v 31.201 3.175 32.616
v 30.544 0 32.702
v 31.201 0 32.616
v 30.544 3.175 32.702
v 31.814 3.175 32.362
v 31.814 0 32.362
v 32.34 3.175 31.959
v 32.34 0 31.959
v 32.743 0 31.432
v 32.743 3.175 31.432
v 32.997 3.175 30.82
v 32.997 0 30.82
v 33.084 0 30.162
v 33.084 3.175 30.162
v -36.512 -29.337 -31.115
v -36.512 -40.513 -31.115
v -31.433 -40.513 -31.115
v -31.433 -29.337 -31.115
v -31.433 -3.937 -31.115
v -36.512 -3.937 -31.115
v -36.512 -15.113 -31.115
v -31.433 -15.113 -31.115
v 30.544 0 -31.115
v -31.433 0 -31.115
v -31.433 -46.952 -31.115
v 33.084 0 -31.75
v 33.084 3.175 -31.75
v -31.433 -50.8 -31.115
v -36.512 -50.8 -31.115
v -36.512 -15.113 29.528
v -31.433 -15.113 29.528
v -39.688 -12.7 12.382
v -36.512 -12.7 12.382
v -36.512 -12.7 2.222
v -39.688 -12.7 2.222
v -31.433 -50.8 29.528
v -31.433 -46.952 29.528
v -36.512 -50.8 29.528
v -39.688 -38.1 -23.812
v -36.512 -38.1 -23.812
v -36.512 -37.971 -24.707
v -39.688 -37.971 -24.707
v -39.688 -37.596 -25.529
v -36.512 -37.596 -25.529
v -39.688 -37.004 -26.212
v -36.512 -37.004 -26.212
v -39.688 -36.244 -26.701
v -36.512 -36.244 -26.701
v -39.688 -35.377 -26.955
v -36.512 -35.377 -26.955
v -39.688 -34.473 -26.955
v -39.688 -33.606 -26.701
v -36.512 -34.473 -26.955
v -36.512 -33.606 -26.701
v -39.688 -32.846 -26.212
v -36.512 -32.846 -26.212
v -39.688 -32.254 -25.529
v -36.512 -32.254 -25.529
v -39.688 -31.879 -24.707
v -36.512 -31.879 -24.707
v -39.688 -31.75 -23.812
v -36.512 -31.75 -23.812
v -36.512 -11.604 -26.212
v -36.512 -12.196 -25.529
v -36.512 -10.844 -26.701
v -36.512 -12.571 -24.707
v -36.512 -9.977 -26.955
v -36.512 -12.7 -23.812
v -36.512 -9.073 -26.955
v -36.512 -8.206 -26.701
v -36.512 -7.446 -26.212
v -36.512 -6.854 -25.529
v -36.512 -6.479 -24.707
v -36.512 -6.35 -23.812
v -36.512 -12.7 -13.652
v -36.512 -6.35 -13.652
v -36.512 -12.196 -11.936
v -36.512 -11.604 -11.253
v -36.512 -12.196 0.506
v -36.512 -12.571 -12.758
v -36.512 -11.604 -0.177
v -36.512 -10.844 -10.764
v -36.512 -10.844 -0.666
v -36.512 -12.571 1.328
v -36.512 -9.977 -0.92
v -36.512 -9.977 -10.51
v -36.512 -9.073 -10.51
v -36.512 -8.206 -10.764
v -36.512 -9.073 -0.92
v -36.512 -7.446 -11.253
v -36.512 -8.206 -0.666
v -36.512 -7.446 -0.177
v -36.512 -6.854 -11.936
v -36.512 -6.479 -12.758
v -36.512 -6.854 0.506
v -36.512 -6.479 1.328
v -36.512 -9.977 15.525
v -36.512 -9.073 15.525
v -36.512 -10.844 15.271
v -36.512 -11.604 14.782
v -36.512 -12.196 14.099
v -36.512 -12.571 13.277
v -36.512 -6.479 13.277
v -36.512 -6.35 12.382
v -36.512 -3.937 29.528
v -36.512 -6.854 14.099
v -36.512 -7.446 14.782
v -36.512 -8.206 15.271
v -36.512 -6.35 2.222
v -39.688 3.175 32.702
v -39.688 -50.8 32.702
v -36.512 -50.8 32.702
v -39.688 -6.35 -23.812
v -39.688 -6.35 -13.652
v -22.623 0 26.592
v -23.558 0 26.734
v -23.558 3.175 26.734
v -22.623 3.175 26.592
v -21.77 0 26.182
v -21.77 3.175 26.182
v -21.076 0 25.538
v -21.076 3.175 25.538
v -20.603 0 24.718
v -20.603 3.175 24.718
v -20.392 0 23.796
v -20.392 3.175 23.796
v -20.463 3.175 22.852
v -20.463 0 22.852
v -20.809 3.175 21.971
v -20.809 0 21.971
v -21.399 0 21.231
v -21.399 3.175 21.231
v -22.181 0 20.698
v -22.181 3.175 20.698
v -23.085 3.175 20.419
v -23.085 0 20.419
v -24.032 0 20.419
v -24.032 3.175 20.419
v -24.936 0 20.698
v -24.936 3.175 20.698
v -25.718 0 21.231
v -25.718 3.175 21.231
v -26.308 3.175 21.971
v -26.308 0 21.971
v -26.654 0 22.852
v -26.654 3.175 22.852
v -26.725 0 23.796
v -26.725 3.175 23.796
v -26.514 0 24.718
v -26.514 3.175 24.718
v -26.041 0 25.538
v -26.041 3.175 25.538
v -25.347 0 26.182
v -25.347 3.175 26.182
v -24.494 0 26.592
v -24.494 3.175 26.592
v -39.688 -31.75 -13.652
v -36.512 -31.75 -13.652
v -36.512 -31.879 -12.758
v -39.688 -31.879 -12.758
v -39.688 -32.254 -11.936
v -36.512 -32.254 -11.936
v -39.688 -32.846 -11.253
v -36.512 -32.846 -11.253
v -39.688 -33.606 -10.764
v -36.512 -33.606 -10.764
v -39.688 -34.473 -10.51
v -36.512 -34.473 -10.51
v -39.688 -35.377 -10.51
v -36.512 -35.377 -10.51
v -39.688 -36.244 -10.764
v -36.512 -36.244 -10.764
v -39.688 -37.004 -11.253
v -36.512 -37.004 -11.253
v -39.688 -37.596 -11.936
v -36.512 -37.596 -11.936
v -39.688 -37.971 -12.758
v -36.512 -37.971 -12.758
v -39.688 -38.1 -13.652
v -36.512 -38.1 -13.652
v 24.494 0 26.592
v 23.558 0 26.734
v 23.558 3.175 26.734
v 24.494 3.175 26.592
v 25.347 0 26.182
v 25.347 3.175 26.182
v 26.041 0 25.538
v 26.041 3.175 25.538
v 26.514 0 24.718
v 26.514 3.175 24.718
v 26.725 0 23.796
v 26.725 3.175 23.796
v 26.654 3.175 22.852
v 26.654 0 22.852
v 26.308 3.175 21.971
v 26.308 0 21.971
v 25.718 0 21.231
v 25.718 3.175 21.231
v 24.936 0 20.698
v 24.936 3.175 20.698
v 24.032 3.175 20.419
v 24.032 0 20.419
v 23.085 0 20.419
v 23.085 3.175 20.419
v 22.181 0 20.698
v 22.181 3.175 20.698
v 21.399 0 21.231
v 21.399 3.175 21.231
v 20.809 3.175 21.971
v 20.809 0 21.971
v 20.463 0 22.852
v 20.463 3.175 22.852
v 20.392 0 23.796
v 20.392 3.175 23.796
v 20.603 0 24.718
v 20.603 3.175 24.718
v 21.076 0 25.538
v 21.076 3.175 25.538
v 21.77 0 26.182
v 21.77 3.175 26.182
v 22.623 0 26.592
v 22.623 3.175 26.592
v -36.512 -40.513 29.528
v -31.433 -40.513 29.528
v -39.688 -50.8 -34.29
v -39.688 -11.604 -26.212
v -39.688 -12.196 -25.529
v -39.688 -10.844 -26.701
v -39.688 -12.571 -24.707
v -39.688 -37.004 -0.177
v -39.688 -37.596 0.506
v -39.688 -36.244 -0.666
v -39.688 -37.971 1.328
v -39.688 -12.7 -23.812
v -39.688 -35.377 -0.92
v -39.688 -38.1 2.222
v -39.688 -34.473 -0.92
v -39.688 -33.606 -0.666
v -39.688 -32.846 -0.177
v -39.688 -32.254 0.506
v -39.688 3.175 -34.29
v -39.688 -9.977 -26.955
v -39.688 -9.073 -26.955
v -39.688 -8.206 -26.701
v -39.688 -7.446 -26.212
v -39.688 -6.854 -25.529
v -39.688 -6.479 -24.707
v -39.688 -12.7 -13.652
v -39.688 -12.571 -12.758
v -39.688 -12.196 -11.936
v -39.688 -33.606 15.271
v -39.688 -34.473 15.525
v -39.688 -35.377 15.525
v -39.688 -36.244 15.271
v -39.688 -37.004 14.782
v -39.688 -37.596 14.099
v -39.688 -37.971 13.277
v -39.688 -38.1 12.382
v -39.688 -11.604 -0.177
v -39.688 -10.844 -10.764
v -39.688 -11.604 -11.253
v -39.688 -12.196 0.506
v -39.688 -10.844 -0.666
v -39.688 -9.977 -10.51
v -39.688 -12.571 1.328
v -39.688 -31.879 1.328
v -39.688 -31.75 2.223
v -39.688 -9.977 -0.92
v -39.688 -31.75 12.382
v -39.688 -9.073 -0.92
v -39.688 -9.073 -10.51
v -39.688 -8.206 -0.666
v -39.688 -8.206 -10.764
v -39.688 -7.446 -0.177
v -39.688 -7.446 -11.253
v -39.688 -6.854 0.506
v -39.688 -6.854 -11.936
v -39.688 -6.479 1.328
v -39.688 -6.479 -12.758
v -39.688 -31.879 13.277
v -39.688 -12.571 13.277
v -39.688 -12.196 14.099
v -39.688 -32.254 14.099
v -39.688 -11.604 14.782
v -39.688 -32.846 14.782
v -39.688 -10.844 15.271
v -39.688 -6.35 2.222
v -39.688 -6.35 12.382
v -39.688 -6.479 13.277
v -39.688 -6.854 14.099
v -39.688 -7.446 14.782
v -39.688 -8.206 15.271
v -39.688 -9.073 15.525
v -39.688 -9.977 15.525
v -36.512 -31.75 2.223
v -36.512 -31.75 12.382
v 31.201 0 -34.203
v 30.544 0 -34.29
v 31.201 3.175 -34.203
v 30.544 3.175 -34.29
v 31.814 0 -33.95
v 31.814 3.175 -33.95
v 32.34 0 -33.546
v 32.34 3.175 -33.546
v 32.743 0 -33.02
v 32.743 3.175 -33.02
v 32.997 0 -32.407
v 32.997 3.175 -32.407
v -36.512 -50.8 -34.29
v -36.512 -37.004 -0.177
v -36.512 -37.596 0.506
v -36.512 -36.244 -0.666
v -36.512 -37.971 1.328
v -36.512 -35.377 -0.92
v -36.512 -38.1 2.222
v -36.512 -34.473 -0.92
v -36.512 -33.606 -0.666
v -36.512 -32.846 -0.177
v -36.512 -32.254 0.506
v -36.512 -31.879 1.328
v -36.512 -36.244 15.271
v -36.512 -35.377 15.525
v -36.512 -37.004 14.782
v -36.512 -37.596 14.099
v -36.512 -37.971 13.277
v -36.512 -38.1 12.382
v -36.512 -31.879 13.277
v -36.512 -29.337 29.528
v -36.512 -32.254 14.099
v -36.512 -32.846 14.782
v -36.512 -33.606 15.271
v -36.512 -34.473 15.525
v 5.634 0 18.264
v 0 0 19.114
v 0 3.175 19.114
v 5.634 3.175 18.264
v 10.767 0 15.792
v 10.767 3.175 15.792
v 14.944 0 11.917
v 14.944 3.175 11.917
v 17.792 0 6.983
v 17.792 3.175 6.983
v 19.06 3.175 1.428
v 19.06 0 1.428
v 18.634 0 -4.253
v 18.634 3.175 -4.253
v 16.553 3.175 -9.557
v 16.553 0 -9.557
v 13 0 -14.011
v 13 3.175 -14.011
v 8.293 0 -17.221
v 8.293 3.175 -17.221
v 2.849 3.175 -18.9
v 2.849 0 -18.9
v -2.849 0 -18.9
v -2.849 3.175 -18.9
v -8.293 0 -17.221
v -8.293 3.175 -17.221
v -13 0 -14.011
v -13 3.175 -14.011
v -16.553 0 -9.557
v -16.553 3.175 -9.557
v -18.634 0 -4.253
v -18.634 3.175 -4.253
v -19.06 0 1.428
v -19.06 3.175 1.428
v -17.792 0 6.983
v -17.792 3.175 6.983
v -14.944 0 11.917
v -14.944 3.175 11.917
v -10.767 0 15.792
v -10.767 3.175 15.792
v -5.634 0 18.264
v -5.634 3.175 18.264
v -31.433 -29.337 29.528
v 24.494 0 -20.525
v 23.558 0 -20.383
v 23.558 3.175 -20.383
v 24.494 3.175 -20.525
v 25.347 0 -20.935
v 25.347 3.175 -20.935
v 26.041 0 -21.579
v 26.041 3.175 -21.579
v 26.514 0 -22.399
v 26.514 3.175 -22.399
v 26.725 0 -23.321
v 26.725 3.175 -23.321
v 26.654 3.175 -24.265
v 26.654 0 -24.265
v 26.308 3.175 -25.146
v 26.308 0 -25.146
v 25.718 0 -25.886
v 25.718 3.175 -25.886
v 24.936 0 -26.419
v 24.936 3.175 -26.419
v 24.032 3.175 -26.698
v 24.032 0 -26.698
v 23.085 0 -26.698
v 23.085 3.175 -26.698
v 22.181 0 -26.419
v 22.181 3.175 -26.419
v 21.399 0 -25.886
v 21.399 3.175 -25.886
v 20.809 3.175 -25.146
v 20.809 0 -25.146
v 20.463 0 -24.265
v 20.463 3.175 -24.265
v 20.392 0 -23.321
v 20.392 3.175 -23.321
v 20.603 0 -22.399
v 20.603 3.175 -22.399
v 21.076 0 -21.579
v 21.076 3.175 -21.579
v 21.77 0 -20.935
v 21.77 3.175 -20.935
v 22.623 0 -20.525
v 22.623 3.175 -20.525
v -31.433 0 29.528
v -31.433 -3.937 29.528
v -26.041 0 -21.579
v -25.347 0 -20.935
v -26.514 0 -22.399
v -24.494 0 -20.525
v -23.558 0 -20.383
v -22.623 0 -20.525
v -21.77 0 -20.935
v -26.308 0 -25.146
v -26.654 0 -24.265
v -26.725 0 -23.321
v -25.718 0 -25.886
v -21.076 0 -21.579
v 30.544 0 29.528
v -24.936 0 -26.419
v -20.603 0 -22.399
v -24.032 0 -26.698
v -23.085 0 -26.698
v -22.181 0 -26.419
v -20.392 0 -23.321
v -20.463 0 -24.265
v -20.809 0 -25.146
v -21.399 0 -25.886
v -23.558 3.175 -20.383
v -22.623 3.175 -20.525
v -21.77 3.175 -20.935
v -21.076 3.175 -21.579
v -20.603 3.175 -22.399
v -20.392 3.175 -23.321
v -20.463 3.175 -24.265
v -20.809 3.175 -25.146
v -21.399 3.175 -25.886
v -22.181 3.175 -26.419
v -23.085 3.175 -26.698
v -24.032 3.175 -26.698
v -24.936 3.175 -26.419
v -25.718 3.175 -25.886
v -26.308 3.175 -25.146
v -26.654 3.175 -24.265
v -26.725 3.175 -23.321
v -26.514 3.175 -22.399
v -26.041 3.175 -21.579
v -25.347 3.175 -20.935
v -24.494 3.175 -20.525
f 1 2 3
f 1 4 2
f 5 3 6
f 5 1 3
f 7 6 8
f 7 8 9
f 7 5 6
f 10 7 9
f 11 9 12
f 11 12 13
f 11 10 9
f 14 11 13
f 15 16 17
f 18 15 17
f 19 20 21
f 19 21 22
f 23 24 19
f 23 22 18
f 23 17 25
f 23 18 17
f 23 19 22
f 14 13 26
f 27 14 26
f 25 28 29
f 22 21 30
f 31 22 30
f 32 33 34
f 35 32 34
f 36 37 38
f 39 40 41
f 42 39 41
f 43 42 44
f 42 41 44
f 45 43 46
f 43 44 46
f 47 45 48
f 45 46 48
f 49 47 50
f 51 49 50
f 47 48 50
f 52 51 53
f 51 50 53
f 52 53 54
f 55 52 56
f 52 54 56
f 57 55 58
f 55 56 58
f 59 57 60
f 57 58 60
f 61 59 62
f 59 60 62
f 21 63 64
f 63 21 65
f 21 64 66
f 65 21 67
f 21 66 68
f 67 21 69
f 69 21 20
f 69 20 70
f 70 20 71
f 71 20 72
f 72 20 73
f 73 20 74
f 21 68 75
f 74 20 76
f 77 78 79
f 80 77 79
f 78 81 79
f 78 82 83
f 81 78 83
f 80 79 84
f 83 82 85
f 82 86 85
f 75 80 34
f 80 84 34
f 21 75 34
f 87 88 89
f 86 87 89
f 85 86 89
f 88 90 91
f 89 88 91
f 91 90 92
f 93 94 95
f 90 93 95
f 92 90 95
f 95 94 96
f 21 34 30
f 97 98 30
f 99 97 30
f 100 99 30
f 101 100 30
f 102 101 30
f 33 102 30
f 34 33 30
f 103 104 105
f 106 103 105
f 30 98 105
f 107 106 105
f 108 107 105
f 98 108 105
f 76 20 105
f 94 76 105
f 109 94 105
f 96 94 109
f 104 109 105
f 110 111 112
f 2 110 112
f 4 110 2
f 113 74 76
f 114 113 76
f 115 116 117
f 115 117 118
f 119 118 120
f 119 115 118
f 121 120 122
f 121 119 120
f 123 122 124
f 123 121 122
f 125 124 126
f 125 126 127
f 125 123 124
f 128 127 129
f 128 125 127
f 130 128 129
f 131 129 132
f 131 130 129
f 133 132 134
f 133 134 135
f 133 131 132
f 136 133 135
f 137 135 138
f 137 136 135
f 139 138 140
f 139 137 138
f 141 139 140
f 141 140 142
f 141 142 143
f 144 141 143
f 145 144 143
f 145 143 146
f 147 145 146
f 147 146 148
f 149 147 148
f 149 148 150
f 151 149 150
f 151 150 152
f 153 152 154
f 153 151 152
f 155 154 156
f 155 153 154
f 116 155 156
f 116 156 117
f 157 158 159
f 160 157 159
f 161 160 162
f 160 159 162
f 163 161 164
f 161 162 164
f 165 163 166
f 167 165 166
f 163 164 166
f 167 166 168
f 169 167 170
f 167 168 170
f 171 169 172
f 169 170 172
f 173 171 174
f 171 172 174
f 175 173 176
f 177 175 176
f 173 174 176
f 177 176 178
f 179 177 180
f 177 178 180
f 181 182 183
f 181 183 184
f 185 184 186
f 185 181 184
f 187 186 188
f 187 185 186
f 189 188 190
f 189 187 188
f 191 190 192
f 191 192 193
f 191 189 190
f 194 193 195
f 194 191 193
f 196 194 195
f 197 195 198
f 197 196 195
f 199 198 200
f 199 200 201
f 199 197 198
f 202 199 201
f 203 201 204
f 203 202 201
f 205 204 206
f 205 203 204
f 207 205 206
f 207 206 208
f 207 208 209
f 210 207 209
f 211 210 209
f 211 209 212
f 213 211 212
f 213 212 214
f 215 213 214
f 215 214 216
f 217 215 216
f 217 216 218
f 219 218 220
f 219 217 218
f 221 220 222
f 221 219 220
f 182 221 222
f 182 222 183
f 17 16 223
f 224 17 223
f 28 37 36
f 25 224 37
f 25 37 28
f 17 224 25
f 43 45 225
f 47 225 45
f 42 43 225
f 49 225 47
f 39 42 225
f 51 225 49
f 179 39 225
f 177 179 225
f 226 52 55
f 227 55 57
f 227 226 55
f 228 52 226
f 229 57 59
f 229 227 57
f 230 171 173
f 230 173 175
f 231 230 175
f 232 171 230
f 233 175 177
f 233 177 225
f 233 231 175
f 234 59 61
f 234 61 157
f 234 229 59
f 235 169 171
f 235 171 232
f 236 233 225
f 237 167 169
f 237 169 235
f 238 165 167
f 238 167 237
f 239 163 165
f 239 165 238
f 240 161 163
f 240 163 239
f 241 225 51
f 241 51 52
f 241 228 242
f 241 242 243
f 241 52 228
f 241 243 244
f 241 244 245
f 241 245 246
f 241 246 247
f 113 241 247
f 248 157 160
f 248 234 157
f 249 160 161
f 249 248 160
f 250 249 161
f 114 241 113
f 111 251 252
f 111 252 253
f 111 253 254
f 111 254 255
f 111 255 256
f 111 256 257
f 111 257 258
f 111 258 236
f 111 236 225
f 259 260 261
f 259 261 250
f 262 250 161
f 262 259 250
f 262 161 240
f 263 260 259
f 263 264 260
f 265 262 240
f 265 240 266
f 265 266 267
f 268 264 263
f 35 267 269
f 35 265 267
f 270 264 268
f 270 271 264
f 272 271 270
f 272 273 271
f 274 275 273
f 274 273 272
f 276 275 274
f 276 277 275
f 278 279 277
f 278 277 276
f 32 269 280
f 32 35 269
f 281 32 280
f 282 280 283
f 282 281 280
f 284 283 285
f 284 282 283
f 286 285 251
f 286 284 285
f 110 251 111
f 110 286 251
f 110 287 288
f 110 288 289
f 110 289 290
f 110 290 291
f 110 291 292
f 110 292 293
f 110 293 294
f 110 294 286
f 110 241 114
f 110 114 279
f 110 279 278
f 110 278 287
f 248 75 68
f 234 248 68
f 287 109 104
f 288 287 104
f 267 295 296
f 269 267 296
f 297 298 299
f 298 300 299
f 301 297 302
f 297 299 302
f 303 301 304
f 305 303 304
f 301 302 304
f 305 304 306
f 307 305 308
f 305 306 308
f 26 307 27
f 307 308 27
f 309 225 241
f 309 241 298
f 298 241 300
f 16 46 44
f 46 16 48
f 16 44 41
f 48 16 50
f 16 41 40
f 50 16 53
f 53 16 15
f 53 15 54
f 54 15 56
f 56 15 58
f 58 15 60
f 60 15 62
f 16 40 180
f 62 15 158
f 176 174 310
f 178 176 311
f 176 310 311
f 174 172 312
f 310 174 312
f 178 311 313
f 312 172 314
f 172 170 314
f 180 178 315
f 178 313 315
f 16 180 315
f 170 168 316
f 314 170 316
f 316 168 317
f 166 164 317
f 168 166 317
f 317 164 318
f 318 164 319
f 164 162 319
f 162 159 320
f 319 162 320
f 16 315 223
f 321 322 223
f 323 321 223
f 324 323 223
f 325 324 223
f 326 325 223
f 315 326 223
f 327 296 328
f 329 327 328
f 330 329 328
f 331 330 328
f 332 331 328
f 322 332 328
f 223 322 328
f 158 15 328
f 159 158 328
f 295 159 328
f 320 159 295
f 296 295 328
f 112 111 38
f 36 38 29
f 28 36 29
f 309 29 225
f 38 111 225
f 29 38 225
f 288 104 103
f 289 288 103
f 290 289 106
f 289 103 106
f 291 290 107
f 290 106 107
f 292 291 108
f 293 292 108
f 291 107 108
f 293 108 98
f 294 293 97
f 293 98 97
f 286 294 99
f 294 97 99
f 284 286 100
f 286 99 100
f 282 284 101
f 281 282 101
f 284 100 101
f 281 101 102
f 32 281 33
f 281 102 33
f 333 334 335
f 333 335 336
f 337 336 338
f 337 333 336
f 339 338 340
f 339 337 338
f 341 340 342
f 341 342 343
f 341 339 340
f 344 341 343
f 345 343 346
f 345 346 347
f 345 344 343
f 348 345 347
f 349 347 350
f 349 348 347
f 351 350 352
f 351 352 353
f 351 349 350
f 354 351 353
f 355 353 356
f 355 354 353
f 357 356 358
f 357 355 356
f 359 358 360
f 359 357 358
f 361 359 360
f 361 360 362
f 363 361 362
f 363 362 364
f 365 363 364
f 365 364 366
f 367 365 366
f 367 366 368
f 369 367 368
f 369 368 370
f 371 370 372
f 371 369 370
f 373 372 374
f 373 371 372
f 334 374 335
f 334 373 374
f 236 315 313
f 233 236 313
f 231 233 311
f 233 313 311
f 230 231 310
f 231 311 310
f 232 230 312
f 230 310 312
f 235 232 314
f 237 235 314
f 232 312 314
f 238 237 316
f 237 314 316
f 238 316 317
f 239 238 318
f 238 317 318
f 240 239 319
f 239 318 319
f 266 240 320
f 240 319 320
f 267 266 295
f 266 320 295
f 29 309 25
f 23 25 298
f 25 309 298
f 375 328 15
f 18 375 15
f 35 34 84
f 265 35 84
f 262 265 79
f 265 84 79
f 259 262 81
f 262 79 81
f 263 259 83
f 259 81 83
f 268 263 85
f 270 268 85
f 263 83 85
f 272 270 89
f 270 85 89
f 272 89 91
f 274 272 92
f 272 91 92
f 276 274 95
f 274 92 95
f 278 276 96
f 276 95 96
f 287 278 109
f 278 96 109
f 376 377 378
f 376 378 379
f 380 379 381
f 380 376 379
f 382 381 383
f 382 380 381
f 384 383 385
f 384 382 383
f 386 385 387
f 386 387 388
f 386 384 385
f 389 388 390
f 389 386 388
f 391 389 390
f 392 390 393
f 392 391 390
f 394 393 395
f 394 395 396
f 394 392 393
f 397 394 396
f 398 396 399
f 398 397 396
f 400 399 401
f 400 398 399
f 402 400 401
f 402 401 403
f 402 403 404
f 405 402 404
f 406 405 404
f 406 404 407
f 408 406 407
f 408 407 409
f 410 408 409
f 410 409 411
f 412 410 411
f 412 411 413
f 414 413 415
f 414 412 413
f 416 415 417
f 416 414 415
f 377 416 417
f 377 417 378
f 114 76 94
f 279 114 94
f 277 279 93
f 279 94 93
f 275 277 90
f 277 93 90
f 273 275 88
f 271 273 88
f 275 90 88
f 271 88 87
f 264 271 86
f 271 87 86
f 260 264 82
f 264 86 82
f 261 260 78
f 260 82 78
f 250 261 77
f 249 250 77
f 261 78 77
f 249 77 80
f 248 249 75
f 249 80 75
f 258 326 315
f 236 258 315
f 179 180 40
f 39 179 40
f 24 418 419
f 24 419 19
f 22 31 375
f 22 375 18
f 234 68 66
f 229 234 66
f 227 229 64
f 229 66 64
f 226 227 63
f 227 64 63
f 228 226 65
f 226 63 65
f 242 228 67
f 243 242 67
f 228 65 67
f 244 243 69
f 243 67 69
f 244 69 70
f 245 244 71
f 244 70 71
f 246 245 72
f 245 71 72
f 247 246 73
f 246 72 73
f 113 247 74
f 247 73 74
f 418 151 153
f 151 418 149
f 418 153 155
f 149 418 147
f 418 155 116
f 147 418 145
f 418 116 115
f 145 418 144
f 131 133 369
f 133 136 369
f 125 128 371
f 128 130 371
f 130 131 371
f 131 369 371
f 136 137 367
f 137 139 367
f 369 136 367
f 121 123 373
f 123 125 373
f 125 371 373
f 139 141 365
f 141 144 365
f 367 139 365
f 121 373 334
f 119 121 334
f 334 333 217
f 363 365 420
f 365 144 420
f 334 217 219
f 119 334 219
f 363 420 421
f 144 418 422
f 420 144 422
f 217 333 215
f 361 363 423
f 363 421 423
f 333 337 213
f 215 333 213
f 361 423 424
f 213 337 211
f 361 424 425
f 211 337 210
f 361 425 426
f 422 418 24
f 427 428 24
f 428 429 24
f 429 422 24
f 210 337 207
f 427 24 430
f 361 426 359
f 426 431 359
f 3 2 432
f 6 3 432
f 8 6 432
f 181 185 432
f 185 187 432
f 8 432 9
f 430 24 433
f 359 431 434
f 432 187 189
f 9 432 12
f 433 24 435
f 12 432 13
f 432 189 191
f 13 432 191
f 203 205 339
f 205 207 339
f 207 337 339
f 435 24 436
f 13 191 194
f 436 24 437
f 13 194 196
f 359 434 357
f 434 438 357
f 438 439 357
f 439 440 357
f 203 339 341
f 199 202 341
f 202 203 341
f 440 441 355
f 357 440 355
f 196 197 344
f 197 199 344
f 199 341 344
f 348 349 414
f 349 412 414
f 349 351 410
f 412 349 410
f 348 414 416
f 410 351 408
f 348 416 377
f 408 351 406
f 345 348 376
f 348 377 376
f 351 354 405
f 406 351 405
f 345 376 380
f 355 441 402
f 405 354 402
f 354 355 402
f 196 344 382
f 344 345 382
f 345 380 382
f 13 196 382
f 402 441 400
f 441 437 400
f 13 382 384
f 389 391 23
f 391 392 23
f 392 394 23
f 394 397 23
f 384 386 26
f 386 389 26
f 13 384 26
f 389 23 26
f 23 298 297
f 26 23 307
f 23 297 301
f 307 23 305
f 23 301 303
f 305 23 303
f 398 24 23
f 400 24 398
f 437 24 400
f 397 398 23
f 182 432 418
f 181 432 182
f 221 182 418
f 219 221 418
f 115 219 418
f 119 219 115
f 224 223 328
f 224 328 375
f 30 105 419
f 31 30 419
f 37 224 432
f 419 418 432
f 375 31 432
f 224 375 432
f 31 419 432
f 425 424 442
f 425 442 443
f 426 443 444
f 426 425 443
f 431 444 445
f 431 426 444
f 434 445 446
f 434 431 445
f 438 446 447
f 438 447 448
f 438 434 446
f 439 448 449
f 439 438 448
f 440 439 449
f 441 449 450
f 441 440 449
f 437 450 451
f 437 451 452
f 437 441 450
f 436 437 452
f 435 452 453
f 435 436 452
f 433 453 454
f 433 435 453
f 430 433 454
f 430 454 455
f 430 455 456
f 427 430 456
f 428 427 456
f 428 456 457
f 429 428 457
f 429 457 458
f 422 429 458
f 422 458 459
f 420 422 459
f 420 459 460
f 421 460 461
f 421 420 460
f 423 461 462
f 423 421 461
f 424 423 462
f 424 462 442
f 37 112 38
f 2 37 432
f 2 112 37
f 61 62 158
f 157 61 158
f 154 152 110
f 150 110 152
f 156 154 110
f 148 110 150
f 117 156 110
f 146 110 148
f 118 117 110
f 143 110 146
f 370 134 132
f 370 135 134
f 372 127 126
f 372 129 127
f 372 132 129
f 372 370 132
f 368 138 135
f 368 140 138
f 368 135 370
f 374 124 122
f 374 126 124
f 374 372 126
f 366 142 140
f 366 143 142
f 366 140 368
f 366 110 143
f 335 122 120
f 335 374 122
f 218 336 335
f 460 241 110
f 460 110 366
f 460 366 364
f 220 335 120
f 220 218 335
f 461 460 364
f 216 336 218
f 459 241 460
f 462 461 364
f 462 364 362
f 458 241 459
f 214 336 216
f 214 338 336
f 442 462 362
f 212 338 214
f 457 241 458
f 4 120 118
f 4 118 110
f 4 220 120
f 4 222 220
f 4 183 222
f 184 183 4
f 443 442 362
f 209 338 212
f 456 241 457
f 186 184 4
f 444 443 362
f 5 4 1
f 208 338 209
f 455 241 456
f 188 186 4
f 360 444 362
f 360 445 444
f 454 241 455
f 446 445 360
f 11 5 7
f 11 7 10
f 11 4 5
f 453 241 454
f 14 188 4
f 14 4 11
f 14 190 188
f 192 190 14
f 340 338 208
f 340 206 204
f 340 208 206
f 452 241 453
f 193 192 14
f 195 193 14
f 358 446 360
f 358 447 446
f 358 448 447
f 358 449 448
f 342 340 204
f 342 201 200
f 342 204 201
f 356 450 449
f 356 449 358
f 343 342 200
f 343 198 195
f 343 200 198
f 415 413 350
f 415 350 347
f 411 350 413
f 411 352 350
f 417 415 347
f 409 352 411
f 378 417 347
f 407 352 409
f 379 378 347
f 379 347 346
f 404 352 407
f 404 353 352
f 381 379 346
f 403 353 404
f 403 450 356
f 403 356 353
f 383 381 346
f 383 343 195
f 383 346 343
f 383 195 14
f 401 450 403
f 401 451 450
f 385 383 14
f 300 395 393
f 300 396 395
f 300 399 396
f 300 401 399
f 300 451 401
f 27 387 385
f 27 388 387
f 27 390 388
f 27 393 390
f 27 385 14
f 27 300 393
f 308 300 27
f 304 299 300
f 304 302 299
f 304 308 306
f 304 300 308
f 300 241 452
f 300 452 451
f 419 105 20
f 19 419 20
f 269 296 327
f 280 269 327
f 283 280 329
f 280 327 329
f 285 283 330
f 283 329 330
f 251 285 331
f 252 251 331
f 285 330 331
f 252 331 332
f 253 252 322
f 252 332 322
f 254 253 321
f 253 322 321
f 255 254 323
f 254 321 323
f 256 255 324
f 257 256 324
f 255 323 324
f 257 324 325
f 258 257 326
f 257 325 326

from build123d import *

# Parameters (mm, degrees)
SKETCH1_W           = 72.771
SKETCH1_H           = 66.9925
SKETCH1_R           = 19.1135
SKETCH1_R_2         = 3.175
BOSS_EXTRUDE1_DEPTH = 3.175
FILLET1_R           = 2.54
SKETCH2_W           = 66.9925
SKETCH2_H           = 50.8
BOSS_EXTRUDE2_DEPTH = 3.175
BOSS_EXTRUDE5_DEPTH = 3.175
BOSS_EXTRUDE6_DEPTH = 3.175
SKETCH9_R           = 3.175
CUT_EXTRUDE1_DEPTH  = 3.175
BOSS_EXTRUDE7_DEPTH = 5.08


with BuildPart() as part:
    # Sketch1 → Boss-Extrude1 (new body)
    with BuildSketch(Plane(origin=(0, 0, 0), x_dir=(1, 0, 0), z_dir=(0, 1, 0))):
        with Locations((-3.302, 0.79375)):
            Rectangle(SKETCH1_W, SKETCH1_H)
        with Locations(Location((0, 0, 0), (0, 0, 270))):
            Circle(SKETCH1_R, mode=Mode.SUBTRACT)
        with Locations(Location((-23.5585, 23.5585, 0), (0, 0, 270))):
            Circle(SKETCH1_R_2, mode=Mode.SUBTRACT)
        with Locations(Location((23.5585, 23.5585, 0), (0, 0, 270))):
            Circle(SKETCH1_R_2, mode=Mode.SUBTRACT)
        with Locations(Location((23.5585, -23.5585, 0), (0, 0, 270))):
            Circle(SKETCH1_R_2, mode=Mode.SUBTRACT)
        with Locations(Location((-23.5585, -23.5585, 0), (0, 0, 270))):
            Circle(SKETCH1_R_2, mode=Mode.SUBTRACT)
    extrude(amount=BOSS_EXTRUDE1_DEPTH)

    # Fillet1
    fillet1_edges = [part.edges().sort_by_distance(p)[0] for p in [
        (33.0835, 1.5875, -34.29),
        (33.0835, 1.5875, 32.7025),
    ]]
    fillet(fillet1_edges, radius=FILLET1_R)

    # Sketch2 → Boss-Extrude2 (add)
    with BuildSketch(Plane.ZY.offset(39.6875)):
        with Locations((-0.79375, -25.4)):
            Rectangle(SKETCH2_W, SKETCH2_H)
    extrude(amount=-BOSS_EXTRUDE2_DEPTH)

    # Sketch7 → Boss-Extrude5 (add)
    with BuildSketch(Plane.XY.offset(32.7025)):
        Polygon((-36.5125, -50.8), (30.5435, 0), (-36.5125, 0), align=None)
    extrude(amount=-BOSS_EXTRUDE5_DEPTH)

    # Sketch8 → Boss-Extrude6 (add)
    with BuildSketch(Plane(origin=(0, 0, -34.29), x_dir=(-1, 0, 0), z_dir=(0, 0, -1))):
        Polygon((-30.5435, 0), (36.5125, 0), (36.5125, -50.8), align=None)
    extrude(amount=-BOSS_EXTRUDE6_DEPTH)

    # Sketch9 → Cut-Extrude1 (cut)
    with BuildSketch(Plane(origin=(-36.5125, 0, 0), x_dir=(0, 0, -1), z_dir=(1, 0, 0))):
        with BuildLine():
            ThreePointArc((-2.2225, -12.7), (-5.3975, -9.525), (-2.2225, -6.35))
            Line((-2.2225, -6.35), (-12.3825, -6.35))
            ThreePointArc((-12.3825, -6.35), (-10.13743597, -7.27993597), (-9.2075, -9.525))
            ThreePointArc((-9.2075, -9.525), (-10.13743597, -11.77006403), (-12.3825, -12.7))
            Line((-12.3825, -12.7), (-2.2225, -12.7))
        make_face()
        with Locations((-2.2225, -9.525)):
            Circle(SKETCH9_R)
        with Locations((-12.3825, -9.525)):
            Circle(SKETCH9_R)
        with BuildLine():
            ThreePointArc((23.8125, -12.7), (20.6375, -9.525), (23.8125, -6.35))
            Line((23.8125, -6.35), (13.6525, -6.35))
            ThreePointArc((13.6525, -6.35), (15.89756403, -7.27993597), (16.8275, -9.525))
            ThreePointArc((16.8275, -9.525), (15.89756403, -11.77006403), (13.6525, -12.7))
            Line((13.6525, -12.7), (23.8125, -12.7))
        make_face()
        with Locations((13.6525, -9.525)):
            Circle(SKETCH9_R)
        with Locations((23.8125, -9.525)):
            Circle(SKETCH9_R)
        with Locations((23.8125, -34.925)):
            Circle(SKETCH9_R)
        with BuildLine():
            Line((13.6525, -38.1), (23.8125, -38.1))
            ThreePointArc((23.8125, -38.1), (20.6375, -34.925), (23.8125, -31.75))
            Line((23.8125, -31.75), (13.6525, -31.75))
            ThreePointArc((13.6525, -31.75), (15.89756403, -32.67993597), (16.8275, -34.925))
            ThreePointArc((16.8275, -34.925), (15.89756403, -37.17006403), (13.6525, -38.1))
        make_face()
        with Locations((13.6525, -34.925)):
            Circle(SKETCH9_R)
        with Locations((-2.2225, -34.925)):
            Circle(SKETCH9_R)
        with BuildLine():
            ThreePointArc((-2.2225, -38.1), (-5.3975, -34.925), (-2.2225, -31.75))
            Line((-2.2225, -31.75), (-12.3825, -31.75))
            ThreePointArc((-12.3825, -31.75), (-10.13743597, -32.67993597), (-9.2075, -34.925))
            ThreePointArc((-9.2075, -34.925), (-10.13743597, -37.17006403), (-12.3825, -38.1))
            Line((-12.3825, -38.1), (-2.2225, -38.1))
        make_face()
        with Locations((-12.3825, -34.925)):
            Circle(SKETCH9_R)
    extrude(amount=-CUT_EXTRUDE1_DEPTH, mode=Mode.SUBTRACT)

    # Sketch10 → Boss-Extrude7 (add)
    with BuildSketch(Plane(origin=(-36.5125, 0, 0), x_dir=(0, 0, -1), z_dir=(1, 0, 0))):
        Polygon((23.8125, -15.113), (-29.5275, -15.113), (-29.5275, -29.337), (23.8125, -29.337), (31.115, -29.337), (31.115, -15.113), align=None)
        Polygon((31.115, 0), (-29.5275, 0), (-29.5275, -3.937), (23.8125, -3.937), (31.115, -3.937), align=None)
        Polygon((23.8125, -40.513), (-29.5275, -40.513), (-29.5275, -50.8), (31.115, -50.8), (31.115, -40.513), align=None)
    extrude(amount=BOSS_EXTRUDE7_DEPTH)


solid = part.part
